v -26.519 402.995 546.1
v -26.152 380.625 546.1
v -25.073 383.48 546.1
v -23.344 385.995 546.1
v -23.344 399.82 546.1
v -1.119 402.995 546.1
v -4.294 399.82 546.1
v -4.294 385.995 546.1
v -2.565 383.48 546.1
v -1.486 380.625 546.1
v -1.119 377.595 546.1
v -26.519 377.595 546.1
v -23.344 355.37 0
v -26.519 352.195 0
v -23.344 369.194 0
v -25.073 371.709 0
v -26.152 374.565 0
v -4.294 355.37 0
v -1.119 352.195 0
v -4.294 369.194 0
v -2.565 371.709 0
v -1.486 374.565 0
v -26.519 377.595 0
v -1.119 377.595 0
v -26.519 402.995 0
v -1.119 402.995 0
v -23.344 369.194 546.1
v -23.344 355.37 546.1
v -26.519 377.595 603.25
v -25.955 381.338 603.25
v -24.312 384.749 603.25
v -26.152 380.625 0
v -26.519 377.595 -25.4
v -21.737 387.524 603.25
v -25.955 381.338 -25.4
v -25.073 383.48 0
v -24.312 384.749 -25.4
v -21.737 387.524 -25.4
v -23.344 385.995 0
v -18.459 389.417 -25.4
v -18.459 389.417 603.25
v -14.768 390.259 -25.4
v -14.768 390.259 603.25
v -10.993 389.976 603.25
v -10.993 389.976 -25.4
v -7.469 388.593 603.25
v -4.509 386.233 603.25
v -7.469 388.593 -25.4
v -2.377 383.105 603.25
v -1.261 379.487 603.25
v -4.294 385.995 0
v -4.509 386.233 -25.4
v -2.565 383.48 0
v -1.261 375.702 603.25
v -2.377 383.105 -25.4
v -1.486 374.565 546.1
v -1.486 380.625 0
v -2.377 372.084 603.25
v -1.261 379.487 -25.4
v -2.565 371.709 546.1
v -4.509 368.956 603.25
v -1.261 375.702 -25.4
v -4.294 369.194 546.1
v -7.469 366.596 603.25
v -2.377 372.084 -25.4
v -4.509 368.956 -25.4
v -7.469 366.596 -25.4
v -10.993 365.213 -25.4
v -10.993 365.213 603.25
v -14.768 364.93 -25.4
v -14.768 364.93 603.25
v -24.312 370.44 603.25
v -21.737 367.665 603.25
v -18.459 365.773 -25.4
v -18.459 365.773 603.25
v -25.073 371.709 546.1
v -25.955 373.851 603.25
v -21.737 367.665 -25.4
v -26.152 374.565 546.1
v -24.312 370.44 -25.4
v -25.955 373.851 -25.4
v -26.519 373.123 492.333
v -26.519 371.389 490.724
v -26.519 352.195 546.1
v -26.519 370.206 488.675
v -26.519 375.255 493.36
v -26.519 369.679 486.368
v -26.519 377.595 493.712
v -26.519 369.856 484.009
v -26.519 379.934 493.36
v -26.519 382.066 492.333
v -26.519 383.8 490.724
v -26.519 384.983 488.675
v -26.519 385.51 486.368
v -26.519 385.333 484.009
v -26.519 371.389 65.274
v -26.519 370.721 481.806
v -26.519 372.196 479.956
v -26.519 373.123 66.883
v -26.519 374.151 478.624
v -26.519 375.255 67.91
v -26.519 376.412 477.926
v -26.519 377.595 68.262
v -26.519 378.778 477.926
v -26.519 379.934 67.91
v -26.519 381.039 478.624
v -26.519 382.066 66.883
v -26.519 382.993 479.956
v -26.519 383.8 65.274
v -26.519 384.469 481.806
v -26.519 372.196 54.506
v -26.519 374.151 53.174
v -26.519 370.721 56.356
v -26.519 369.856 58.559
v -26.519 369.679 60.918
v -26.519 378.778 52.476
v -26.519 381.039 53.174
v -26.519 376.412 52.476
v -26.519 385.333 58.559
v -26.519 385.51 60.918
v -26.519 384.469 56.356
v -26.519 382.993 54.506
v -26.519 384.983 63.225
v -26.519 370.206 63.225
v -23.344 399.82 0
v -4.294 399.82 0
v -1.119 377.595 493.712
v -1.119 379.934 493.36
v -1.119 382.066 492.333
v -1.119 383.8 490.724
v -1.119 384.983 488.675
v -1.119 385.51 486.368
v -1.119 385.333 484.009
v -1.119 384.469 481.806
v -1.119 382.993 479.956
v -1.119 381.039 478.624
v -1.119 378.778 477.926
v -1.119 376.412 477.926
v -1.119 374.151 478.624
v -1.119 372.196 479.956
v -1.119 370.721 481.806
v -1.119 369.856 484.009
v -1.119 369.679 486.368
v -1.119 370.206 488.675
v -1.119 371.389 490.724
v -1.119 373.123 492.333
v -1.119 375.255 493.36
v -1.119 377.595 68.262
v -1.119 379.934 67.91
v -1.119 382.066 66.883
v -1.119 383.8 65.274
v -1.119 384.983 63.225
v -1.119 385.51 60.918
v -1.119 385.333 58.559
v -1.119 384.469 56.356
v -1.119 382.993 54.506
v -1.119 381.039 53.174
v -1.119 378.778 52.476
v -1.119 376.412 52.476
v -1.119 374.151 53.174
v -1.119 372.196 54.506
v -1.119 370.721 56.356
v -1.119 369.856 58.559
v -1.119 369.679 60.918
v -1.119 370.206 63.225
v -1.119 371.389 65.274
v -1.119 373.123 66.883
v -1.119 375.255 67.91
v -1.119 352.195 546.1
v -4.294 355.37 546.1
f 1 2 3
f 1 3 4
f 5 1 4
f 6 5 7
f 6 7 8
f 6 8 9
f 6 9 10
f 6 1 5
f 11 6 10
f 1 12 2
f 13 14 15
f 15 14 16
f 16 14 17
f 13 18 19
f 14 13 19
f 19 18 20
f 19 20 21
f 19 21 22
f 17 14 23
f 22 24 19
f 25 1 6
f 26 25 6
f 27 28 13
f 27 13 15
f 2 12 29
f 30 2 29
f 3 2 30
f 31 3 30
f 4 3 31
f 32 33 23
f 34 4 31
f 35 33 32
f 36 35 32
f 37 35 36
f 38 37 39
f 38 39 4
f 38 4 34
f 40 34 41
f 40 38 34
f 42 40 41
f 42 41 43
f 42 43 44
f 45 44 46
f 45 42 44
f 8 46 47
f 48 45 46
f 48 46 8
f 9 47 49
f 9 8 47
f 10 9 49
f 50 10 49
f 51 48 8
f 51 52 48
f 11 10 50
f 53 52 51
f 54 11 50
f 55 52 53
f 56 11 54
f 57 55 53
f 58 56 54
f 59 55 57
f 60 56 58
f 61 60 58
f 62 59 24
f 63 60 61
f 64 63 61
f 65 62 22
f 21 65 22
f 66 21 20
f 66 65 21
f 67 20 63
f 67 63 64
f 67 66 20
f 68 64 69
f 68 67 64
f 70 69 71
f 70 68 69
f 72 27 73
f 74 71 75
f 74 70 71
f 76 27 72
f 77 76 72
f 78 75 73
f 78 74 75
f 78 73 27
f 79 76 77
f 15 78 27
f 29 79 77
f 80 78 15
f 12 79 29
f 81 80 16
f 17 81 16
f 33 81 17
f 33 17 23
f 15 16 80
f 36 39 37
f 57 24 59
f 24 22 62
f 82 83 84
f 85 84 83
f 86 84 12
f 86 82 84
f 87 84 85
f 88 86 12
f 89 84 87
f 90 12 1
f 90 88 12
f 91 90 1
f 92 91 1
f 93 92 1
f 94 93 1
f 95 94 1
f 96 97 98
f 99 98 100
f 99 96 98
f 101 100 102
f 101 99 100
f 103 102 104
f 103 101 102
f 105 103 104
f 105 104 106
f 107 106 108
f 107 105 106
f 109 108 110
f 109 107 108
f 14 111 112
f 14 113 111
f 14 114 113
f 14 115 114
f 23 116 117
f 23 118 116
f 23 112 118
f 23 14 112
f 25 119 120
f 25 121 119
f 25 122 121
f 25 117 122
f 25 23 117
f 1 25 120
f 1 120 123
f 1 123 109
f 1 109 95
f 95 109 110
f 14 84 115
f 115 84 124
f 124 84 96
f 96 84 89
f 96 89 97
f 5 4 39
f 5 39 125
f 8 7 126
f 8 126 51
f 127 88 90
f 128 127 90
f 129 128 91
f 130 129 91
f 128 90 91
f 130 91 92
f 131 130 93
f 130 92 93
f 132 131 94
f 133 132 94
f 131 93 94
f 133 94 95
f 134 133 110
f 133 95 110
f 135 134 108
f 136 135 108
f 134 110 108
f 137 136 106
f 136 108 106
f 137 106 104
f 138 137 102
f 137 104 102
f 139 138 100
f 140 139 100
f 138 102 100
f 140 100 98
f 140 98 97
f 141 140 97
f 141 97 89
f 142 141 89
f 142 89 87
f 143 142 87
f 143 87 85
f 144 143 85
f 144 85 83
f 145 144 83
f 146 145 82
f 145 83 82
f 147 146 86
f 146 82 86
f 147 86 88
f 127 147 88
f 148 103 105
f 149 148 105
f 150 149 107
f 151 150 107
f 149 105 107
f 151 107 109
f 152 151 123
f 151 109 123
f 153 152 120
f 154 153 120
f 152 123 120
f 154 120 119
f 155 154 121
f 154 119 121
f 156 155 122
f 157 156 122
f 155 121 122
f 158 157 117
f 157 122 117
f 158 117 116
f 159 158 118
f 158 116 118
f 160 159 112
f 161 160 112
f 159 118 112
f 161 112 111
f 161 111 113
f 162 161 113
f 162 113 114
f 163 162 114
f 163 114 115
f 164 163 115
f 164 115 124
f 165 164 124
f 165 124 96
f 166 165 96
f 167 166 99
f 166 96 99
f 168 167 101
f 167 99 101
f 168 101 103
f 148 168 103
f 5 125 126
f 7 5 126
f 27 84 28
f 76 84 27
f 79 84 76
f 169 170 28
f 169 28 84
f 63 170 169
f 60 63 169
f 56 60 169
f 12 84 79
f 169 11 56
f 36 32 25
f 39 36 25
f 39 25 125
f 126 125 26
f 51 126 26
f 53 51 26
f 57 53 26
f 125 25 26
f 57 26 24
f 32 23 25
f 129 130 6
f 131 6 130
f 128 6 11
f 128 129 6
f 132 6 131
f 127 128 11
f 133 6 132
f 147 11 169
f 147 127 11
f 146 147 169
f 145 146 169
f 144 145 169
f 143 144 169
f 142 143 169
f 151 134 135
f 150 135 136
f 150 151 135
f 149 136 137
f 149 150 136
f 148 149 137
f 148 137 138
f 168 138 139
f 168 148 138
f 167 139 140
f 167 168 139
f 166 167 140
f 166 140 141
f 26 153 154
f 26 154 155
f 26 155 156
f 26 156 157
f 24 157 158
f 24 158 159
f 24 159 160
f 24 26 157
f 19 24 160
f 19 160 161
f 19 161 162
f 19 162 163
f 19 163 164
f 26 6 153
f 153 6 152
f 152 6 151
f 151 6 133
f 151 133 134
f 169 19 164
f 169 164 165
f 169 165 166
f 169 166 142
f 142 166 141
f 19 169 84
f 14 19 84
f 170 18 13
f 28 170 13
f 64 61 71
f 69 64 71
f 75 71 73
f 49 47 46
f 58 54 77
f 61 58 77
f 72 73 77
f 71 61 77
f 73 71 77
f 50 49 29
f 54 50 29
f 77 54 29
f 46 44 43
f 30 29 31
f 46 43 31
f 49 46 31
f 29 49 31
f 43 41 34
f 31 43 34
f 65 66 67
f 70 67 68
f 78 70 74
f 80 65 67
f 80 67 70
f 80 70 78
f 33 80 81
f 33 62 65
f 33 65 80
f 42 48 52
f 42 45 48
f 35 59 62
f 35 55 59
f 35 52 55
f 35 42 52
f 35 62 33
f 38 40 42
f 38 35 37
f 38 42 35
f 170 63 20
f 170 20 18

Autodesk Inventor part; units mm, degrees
ref_plane "YZ Plane" through (0, 0, 0) normal (1, 0, 0) x (0, 1, 0)
ref_plane "XZ Plane" through (0, 0, 0) normal (0, 1, 0) x (-1, 0, 0)
ref_plane "XY Plane" through (0, 0, 0) normal (0, 0, 1) x (1, 0, 0)
sketch "Sketch1" plane through (0, 0, 0) normal (0, 0, 1) x (1, 0, 0)
  line L0 (-26.5191, 402.9946) -> (-1.1191, 402.9946)
  line L1 (-1.1191, 402.9946) -> (-1.1191, 352.1946)
  line L2 (-1.1191, 352.1946) -> (-26.5191, 352.1946)
  line L3 (-26.5191, 352.1946) -> (-26.5191, 402.9946)
  line L4 (-23.3441, 399.8196) -> (-4.2941, 399.8196)
  line L5 (-4.2941, 399.8196) -> (-4.2941, 355.3696)
  line L6 (-4.2941, 355.3696) -> (-23.3441, 355.3696)
  line L7 (-23.3441, 355.3696) -> (-23.3441, 399.8196)
  point P0 (0, 0)
  dimension "d0" = 50.8
  dimension "d1" = 25.4
  dimension "d2" = 3.175
extrude "Extrusion1" add sketch "Sketch1" along normal blind 546.1
sketch "Sketch2" plane through (0, 0, 0) normal (0, 0, -1) x (-1, 0, 0)
  circle A0 centre (13.8191, 377.5946) radius 12.7
  line L0 (23.3441, 399.8196) -> (23.3441, 355.3696) projected
  line L1 (23.3441, 355.3696) -> (4.2941, 355.3696) projected
  point P0 (0, 0)
  point P1 (23.3441, 377.5946)
  point P2 (13.8191, 355.3696)
  dimension "d6" = 25.4
extrude "Extrusion2" add sketch "Sketch2" along normal blind 25.4 and the other way blind 603.25
sketch "Sketch4" plane through (-26.5191, 352.1946, 0) normal (-1, 0, 0) x (0, 0, 1)
  circle A0 centre (60.325, 25.4) radius 7.9375
  line L0 (0, 25.4) -> (0, 50.8) projected
  circle A1 centre (485.775, 25.4) radius 7.9375
  line L1 (546.1, 0) -> (546.1, 25.4) projected
  line L2 (0, 25.4) -> (0, 0) projected
  point P0 (0, -352.1946)
  point P1 (273.05, 25.4)
  dimension "d17" = 15.875
  dimension "d19" = 15.875
  dimension "d23" = 546.1
  dimension "d24" = 273.05
  dimension "d26" = 212.725
  dimension "d27" = 425.45
extrude "Extrusion4" cut sketch "Sketch4" against normal through all
equation "\"d19\" = d17"
equation "\"d24\" = 0.5 * d23"
equation "\"d26\" = 0.5 * d27"
properties part number "Intake 3 Cross Bar"
